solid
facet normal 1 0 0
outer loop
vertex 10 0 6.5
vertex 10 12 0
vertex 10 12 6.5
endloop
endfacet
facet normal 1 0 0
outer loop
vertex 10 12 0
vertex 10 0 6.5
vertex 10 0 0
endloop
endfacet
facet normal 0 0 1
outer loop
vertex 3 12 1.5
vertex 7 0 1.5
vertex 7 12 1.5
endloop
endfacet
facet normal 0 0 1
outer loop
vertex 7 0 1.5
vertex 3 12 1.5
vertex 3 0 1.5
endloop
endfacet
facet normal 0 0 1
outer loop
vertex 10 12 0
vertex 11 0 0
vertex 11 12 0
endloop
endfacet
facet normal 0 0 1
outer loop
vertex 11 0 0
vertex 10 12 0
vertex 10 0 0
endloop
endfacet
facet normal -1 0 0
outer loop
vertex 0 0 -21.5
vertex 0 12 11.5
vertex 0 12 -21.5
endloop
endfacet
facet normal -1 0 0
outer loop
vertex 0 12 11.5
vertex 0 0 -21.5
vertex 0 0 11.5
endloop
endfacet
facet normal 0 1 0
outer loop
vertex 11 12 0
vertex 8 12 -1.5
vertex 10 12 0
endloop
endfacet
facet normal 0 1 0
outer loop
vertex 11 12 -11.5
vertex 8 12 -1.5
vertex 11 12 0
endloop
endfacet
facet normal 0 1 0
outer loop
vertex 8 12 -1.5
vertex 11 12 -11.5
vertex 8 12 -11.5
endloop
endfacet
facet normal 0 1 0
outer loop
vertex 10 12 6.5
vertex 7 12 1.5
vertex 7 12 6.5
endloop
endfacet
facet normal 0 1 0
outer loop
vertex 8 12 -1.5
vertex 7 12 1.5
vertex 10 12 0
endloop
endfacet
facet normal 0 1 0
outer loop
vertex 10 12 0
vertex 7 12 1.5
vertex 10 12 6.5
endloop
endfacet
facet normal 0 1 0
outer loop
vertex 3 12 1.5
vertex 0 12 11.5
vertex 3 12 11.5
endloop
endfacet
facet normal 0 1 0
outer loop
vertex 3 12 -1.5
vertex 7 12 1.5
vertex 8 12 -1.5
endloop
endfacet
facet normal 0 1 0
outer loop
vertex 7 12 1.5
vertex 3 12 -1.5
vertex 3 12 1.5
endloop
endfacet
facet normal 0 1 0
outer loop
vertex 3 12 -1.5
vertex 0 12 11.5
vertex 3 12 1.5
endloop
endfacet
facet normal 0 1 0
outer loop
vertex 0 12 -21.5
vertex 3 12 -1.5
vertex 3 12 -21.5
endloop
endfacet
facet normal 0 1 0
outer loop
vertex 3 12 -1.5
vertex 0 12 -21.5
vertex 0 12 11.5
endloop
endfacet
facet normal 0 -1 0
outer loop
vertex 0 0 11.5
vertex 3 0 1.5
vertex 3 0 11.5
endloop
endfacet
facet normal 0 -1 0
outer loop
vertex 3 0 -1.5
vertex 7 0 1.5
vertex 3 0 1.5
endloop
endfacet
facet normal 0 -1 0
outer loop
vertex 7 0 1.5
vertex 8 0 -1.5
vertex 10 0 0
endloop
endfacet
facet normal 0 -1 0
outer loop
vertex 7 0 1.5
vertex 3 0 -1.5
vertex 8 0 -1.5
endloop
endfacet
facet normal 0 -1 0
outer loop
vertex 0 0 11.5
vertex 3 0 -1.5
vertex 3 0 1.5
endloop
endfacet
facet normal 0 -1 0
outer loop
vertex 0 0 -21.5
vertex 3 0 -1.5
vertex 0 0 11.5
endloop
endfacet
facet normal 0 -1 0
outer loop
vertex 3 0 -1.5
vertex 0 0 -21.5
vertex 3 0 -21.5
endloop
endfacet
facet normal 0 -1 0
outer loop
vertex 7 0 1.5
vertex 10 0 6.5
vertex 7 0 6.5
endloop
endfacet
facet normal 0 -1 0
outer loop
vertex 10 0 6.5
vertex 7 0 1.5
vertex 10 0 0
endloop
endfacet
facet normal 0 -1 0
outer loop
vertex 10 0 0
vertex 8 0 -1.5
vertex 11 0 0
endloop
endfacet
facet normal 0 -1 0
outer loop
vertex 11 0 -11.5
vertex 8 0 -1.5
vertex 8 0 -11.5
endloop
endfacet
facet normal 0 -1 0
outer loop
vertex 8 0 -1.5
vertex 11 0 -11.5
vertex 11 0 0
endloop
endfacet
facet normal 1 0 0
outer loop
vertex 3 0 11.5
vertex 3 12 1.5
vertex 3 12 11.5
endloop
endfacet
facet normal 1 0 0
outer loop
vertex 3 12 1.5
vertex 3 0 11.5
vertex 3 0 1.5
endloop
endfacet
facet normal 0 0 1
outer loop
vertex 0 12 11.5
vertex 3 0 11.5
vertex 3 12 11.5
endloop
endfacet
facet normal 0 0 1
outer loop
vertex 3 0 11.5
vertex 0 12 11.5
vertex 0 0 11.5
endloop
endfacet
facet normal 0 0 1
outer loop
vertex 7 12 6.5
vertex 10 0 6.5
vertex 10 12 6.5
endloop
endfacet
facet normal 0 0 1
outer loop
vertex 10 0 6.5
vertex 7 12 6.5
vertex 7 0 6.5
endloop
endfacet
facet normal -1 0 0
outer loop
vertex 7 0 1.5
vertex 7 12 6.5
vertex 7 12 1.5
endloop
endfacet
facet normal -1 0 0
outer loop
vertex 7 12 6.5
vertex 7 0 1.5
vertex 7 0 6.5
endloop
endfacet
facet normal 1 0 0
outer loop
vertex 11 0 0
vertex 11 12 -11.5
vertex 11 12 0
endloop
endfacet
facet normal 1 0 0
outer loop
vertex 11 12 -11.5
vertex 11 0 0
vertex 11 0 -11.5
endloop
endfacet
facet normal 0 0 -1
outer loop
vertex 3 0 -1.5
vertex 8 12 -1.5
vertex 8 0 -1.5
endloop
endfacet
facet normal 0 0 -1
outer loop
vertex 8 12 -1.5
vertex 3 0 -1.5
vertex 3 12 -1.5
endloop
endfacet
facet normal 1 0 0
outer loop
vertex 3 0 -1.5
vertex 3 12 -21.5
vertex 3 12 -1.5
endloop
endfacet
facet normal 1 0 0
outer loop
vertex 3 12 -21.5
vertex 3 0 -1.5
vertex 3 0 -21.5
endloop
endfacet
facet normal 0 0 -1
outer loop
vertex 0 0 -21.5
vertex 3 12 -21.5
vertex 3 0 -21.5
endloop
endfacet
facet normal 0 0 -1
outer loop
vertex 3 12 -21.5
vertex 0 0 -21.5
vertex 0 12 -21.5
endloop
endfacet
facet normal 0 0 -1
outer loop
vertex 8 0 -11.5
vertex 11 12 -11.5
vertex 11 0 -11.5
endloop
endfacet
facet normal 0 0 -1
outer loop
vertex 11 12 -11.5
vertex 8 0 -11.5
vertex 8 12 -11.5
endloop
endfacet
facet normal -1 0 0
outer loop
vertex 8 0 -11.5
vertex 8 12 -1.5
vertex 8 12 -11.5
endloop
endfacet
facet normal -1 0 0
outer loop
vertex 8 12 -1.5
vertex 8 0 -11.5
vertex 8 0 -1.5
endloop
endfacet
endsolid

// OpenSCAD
//smart phone thick in mm
smartphone_thick = 4; // [1:20]


//laptop screen thick in mm
laptop_screen_thick = 5; // [10:25]

// thing border thick in mm
my_thing_thick = 3; // [2:5]

// thing length
my_thing_length = 12; //[10:20]

//upper back high
upper_back_high = 10; // [10:20]

//upper front high
upper_front_high = 5; // [5:10]

//lower back high
lower_back_high = 20; // [10:20]

//lower front high
lower_front_high = 10; // [10:20]

upperPart();
lowerPart();

module upperPart(){    
    cube([smartphone_thick + my_thing_thick * 2 , my_thing_length, my_thing_thick/2]);
    translate([0, 0, my_thing_thick/2]) cube([my_thing_thick, my_thing_length, upper_back_high]);
    translate([my_thing_thick + smartphone_thick, 0, my_thing_thick/2]) cube([my_thing_thick, my_thing_length, upper_front_high]);
    
}

module lowerPart(){
    translate([0,0, -my_thing_thick/2]) cube([laptop_screen_thick + my_thing_thick * 2 , my_thing_length, my_thing_thick/2]);
    translate([0, 0, - lower_back_high - my_thing_thick/2]) cube([my_thing_thick, my_thing_length, lower_back_high]);
    translate([my_thing_thick + laptop_screen_thick, 0, - lower_front_high - my_thing_thick/2]) cube([my_thing_thick, my_thing_length, lower_front_high]);
    
}
